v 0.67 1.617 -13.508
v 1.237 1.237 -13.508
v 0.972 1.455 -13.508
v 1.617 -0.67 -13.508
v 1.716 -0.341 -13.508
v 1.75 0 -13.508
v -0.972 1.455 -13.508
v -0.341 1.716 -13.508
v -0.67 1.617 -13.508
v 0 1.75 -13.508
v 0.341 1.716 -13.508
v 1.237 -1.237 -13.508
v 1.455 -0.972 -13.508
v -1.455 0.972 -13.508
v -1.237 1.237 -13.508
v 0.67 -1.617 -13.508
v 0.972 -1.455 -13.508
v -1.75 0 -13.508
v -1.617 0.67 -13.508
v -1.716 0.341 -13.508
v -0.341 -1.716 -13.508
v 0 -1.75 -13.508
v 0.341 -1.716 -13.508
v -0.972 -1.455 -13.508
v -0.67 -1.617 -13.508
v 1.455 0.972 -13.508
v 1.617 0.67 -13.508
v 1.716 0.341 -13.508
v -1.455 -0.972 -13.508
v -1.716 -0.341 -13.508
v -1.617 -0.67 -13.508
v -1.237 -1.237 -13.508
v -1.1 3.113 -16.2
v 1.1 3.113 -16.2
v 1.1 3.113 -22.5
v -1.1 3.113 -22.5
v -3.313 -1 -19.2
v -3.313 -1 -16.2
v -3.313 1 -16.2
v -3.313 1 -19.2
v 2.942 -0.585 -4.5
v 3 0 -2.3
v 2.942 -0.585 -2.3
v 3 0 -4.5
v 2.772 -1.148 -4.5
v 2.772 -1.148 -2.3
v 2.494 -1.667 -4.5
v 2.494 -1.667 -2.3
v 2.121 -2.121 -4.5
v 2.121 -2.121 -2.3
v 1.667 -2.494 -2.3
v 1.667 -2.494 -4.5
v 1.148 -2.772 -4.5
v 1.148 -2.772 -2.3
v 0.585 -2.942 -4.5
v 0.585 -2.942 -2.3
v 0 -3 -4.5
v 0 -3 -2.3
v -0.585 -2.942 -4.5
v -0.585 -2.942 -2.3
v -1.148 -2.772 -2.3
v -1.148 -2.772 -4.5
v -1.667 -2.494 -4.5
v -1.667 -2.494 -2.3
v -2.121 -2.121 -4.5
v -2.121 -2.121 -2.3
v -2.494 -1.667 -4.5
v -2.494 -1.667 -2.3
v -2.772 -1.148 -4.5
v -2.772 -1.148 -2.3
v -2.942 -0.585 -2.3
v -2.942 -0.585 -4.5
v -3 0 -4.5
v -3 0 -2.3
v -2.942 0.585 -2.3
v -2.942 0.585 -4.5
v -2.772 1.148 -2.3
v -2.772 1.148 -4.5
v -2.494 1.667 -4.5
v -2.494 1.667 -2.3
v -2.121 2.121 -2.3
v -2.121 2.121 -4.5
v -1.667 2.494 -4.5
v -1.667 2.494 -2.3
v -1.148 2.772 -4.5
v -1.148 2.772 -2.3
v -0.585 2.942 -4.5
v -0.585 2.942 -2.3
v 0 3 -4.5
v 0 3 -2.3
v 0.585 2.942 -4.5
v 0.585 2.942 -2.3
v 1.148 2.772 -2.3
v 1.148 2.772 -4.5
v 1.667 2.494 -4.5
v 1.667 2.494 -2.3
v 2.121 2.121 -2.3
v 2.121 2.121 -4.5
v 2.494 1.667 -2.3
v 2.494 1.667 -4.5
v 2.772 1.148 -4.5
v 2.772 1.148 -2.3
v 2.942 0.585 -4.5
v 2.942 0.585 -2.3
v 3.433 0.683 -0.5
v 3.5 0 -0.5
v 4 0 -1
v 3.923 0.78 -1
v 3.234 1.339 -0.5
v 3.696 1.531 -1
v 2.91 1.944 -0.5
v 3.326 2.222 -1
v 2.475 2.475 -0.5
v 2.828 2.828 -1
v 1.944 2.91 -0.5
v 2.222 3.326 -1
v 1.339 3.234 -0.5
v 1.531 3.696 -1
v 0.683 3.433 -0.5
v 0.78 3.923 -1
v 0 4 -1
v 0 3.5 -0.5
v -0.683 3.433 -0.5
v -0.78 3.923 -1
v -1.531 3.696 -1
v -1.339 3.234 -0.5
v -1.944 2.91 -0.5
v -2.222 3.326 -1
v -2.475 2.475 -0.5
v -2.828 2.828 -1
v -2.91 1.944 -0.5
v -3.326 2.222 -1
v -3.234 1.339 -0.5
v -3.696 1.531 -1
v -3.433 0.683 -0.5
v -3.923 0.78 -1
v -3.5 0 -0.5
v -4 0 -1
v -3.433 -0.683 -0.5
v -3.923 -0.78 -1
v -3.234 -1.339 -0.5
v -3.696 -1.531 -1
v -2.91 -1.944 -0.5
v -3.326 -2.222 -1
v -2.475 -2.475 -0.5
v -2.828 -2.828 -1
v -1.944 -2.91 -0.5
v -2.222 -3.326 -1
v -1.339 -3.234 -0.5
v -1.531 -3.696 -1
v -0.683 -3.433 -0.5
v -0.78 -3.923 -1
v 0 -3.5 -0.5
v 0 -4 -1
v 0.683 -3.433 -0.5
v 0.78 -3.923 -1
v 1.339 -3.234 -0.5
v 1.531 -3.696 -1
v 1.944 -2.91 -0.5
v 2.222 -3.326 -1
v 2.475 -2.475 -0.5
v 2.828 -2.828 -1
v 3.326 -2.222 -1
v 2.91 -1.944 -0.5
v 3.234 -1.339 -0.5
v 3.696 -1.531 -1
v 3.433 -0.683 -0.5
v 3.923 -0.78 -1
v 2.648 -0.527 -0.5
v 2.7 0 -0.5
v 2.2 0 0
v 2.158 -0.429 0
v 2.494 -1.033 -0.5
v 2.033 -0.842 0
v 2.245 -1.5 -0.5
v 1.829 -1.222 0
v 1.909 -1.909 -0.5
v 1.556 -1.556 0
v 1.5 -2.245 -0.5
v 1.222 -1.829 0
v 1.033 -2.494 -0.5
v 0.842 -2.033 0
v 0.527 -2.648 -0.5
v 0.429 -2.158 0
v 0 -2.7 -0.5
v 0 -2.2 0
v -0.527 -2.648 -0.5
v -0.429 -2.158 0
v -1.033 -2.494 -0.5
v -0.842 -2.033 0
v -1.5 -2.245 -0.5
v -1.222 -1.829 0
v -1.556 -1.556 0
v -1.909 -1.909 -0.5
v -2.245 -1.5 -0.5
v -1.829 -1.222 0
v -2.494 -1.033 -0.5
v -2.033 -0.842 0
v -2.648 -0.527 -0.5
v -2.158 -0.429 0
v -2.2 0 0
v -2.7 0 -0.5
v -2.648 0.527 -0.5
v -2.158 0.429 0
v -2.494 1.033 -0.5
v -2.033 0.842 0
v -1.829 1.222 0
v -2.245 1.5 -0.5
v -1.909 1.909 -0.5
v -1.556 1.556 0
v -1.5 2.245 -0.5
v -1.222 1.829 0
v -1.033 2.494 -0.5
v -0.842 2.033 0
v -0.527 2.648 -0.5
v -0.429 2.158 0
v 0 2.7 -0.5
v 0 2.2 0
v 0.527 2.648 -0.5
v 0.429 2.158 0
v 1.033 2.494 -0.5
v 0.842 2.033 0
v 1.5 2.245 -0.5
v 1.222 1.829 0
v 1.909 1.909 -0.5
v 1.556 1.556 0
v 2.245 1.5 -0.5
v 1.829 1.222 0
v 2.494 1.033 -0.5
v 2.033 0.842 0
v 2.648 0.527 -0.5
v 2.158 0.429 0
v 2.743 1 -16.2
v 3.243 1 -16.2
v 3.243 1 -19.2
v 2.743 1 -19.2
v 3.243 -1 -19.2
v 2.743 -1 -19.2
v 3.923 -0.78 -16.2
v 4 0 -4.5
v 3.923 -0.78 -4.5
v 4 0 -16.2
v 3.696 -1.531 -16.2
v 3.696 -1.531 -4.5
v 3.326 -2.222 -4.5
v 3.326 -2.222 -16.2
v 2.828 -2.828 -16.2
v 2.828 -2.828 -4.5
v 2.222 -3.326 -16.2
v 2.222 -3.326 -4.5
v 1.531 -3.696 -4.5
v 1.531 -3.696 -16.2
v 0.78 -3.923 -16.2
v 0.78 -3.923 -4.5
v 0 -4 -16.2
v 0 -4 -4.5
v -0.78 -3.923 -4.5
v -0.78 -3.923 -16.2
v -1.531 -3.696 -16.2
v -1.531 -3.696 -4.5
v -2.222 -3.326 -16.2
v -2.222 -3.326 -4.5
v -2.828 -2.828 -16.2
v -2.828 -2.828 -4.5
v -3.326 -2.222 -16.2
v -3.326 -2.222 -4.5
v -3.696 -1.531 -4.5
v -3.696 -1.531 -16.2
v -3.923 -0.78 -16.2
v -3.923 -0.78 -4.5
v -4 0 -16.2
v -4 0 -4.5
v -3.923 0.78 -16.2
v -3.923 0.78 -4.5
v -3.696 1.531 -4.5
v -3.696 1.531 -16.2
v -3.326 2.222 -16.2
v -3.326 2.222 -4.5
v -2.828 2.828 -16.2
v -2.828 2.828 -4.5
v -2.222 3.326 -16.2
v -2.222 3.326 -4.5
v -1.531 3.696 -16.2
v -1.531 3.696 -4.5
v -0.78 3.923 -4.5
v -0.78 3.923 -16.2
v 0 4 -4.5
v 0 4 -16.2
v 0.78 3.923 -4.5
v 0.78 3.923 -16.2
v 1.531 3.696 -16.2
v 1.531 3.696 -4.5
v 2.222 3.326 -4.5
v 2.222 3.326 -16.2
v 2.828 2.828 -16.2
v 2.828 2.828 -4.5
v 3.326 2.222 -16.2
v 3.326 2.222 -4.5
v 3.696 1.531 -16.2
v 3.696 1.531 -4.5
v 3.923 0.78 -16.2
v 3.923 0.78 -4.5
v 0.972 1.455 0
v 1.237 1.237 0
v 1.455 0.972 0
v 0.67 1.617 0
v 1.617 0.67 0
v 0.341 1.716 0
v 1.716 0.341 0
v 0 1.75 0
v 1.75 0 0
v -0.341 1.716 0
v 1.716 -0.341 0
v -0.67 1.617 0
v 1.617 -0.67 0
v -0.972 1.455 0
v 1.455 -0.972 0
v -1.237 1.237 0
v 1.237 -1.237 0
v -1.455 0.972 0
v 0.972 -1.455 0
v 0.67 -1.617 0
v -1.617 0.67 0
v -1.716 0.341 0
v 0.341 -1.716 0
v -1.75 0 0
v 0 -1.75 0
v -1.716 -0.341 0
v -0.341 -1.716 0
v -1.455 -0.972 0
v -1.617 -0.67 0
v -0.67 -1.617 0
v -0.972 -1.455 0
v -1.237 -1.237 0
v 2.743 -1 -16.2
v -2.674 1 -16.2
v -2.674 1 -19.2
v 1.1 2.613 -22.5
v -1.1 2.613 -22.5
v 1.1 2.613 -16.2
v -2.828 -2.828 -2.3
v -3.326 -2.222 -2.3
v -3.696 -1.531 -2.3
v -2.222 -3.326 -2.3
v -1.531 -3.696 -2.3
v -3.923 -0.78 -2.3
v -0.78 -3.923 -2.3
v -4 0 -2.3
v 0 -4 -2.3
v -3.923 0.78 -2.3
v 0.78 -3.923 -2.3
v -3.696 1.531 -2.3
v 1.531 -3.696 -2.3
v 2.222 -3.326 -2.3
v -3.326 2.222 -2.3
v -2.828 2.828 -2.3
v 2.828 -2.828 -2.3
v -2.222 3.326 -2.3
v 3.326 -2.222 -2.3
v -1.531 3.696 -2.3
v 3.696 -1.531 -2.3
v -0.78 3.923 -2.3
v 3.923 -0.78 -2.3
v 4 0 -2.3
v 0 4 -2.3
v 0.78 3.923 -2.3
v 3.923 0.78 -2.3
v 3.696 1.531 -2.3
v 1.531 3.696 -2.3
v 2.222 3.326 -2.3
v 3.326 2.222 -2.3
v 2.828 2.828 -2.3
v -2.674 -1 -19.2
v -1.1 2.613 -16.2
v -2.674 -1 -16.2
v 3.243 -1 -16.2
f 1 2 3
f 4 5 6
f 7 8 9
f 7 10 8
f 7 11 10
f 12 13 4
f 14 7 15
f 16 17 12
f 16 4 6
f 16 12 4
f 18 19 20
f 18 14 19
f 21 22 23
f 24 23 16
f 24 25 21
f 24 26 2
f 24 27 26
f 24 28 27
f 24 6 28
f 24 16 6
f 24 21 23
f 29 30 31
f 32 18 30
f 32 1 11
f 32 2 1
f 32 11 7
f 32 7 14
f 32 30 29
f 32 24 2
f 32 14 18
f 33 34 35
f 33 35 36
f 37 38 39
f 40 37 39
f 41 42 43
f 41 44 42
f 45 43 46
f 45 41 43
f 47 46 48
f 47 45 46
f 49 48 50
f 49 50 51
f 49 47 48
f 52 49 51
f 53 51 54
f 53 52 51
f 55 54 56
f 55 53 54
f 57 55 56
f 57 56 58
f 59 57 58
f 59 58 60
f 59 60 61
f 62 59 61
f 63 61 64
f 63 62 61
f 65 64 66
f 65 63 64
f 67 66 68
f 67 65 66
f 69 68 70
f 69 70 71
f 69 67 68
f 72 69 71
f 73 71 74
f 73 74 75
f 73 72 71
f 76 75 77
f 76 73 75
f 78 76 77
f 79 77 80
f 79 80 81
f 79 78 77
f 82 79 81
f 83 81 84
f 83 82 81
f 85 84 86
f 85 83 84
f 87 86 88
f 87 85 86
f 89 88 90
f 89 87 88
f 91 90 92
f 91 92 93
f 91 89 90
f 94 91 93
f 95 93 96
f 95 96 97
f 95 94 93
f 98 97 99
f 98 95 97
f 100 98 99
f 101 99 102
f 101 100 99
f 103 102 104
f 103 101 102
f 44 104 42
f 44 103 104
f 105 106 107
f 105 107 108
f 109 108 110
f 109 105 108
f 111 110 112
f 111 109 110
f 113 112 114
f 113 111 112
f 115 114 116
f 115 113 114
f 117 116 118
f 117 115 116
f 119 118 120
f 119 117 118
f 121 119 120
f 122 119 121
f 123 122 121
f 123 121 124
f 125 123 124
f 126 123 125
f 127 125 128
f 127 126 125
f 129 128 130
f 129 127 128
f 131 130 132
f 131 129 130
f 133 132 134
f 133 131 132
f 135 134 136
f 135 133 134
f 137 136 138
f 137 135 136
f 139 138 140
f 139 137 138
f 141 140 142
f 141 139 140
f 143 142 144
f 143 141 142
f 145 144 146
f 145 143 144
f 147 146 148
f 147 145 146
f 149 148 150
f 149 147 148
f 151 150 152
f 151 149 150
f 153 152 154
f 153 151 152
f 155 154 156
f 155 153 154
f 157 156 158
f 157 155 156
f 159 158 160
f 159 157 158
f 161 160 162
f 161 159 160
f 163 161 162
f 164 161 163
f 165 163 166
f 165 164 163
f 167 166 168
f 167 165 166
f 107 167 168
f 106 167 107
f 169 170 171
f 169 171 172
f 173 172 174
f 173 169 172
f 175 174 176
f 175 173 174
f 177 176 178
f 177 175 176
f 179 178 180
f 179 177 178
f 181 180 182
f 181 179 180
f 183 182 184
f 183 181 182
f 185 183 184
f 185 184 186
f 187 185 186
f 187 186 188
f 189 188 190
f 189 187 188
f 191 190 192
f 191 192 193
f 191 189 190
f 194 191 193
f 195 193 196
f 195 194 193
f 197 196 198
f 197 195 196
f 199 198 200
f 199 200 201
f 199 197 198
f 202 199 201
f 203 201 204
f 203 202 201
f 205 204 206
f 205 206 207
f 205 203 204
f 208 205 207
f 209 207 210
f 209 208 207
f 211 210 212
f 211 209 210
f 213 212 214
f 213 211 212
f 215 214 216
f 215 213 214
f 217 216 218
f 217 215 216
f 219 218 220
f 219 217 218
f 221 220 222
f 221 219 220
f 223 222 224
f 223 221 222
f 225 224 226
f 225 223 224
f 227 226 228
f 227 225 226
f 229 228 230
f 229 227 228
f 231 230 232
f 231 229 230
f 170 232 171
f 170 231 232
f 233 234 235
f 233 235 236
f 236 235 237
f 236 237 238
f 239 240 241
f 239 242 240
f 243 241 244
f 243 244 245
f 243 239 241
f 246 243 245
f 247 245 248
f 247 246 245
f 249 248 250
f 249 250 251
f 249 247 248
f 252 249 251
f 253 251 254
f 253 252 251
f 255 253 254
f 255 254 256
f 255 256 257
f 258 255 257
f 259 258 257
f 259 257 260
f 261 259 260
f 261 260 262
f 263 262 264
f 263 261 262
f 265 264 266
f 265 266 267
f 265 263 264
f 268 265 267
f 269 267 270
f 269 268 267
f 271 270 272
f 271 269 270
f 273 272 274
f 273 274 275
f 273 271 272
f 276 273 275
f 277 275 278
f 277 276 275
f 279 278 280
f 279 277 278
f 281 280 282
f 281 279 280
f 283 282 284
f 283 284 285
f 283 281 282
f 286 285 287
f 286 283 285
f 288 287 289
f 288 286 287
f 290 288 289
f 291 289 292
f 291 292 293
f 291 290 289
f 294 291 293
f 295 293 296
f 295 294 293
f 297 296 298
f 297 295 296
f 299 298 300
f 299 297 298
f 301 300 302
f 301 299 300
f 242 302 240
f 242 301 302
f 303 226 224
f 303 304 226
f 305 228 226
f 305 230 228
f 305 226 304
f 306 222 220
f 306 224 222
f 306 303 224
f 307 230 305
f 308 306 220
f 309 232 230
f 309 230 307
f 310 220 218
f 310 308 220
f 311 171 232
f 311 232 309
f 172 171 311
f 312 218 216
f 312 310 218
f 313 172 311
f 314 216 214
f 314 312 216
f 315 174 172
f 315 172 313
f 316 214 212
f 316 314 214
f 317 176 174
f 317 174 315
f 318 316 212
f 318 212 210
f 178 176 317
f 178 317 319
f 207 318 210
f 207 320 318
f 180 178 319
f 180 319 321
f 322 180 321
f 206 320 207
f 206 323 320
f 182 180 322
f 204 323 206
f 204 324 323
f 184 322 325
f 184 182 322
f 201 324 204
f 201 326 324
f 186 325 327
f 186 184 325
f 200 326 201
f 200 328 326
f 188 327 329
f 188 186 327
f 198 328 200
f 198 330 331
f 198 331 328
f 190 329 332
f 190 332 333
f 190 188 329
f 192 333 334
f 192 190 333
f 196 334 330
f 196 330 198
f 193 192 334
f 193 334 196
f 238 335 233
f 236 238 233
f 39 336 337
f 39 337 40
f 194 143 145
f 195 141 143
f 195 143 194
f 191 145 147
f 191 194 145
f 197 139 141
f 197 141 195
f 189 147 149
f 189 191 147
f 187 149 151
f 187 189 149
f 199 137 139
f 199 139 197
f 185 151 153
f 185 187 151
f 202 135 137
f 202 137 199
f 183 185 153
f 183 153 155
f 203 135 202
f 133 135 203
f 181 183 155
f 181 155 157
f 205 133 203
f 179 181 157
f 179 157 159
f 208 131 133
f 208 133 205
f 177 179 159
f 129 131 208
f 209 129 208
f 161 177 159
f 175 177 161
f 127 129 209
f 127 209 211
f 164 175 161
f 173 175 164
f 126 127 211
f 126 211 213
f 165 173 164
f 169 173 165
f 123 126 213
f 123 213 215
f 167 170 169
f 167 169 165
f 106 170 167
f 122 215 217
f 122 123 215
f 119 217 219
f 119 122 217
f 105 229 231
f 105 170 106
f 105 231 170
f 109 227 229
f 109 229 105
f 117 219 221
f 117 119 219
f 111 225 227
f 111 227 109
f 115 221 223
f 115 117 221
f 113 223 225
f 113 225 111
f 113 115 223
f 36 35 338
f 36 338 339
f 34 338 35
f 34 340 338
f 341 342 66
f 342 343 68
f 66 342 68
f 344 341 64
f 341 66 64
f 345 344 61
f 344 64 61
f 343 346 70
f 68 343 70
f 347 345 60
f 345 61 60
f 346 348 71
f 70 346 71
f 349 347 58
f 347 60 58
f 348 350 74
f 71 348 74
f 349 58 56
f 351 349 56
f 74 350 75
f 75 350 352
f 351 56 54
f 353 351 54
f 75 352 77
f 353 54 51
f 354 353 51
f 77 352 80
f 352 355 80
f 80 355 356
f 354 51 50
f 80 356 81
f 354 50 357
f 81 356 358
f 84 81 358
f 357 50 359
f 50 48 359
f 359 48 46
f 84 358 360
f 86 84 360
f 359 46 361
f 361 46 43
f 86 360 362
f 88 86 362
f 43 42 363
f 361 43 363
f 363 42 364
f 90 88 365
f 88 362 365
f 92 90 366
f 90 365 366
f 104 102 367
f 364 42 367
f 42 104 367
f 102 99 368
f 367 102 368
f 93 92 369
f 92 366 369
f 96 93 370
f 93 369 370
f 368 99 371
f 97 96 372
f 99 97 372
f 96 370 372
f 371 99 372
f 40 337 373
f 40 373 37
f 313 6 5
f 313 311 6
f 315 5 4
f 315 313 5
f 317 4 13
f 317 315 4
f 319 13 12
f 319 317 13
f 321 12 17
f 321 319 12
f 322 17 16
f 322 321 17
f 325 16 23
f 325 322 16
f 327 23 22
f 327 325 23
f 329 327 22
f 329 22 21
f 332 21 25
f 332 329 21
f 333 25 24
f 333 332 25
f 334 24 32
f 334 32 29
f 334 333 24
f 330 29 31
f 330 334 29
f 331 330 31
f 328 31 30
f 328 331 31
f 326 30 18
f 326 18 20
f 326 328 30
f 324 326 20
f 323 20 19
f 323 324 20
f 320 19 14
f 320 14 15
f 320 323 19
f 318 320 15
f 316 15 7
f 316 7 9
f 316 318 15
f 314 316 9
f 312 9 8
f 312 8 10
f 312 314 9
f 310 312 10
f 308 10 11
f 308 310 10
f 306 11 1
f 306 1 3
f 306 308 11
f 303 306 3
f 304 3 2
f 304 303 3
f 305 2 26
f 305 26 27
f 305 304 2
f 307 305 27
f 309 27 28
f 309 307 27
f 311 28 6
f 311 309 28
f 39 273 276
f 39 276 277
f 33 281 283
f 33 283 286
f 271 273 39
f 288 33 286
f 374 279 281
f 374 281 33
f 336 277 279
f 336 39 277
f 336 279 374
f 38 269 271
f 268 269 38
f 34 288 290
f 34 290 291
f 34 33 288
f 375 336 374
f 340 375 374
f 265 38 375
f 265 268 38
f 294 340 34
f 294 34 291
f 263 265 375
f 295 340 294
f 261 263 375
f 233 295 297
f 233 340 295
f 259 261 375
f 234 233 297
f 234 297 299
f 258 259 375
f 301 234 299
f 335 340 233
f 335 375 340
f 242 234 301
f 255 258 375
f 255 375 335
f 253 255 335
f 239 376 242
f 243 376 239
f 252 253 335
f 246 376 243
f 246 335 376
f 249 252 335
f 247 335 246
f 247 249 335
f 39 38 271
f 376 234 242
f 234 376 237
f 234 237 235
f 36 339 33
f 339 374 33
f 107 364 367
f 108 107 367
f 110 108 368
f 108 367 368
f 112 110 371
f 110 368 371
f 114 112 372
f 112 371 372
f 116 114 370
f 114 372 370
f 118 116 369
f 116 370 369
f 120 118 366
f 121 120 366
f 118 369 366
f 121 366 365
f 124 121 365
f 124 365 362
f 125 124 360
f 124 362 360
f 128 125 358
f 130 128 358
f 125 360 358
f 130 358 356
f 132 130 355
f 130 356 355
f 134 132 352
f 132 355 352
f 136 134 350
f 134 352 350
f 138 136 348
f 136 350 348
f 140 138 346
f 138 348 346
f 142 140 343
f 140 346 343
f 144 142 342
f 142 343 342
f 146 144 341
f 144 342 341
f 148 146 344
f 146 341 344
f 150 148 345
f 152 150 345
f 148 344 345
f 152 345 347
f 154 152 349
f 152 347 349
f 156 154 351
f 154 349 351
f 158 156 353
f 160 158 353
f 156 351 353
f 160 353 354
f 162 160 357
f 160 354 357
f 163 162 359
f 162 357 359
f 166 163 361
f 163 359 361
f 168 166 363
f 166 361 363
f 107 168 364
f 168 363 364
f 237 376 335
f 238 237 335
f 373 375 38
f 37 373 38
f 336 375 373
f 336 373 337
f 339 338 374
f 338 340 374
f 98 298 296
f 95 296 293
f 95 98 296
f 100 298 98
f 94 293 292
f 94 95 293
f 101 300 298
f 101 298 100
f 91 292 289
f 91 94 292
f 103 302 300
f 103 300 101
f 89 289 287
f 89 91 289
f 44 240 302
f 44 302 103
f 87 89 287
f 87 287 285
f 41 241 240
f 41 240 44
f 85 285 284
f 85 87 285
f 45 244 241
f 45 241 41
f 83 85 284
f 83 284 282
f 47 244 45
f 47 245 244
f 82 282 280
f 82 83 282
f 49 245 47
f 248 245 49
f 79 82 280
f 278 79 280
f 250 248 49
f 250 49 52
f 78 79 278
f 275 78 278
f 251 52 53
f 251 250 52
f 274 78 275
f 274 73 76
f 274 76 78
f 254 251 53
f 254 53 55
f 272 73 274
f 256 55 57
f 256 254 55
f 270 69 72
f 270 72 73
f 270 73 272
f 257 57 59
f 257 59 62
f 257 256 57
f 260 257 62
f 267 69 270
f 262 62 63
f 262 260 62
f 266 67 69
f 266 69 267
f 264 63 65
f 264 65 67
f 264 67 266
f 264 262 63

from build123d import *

# Parameters (mm, degrees)
BOSS_EXTRUDE1_START = -2.3
SKETCH2_R           = 4
SKETCH2_R_2         = 2.6
BOSS_EXTRUDE1_DEPTH = 1.8
CHAMFER1_SIZE       = 0.5
SKETCH3_W           = 0.5
SKETCH3_H           = 2
SKETCH3_W_2         = 2.2
SKETCH3_H_2         = 0.5
SKETCH3_W_3         = 0.638814793
BOSS_EXTRUDE2_DEPTH = 3
SKETCH4_W           = 2.2
SKETCH4_H           = 0.5
BOSS_EXTRUDE3_DEPTH = 3.3


with BuildPart() as part:
    # Sketch1 → Revolve1 (revolve)
    with BuildSketch(Plane(origin=(0, 0, 0), x_dir=(0, 0, -1), z_dir=(1, 0, 0)), mode=Mode.PRIVATE) as revolve1_sk:
        Polygon((0, 1.75), (0, 2.2), (0.8, 3), (4.5, 3), (4.5, 4), (16.2, 4), (16.2, 0), (13.508423887, 0), (13.508423887, 1.75), align=None)
    revolve(revolve1_sk.sketch.rotate(Axis((0, 0, 3.985074627), (0, 0, -1)), 90), axis=Axis((0, 0, 3.985074627), (0, 0, -1)))

    # Sketch2 → Boss-Extrude1 (add)
    with BuildSketch(Plane.XY.offset(BOSS_EXTRUDE1_START)):
        Circle(SKETCH2_R)
        Circle(SKETCH2_R_2, mode=Mode.SUBTRACT)
    extrude(amount=BOSS_EXTRUDE1_DEPTH)

    # Chamfer1
    chamfer1_edges = [part.edges().sort_by_distance(p)[0] for p in [
        (-4, 0, -0.5),
    ]]
    chamfer(chamfer1_edges, length=CHAMFER1_SIZE)

    # Sketch3 → Boss-Extrude2 (add)
    with BuildSketch(Plane(origin=(0, 0, -16.2), x_dir=(-1, 0, 0), z_dir=(0, 0, -1))):
        with Locations((-2.993209108, 0)):
            Rectangle(SKETCH3_W, SKETCH3_H)
        with Locations((0, 2.862816669)):
            Rectangle(SKETCH3_W_2, SKETCH3_H_2)
        with Locations((2.993209109, 0)):
            Rectangle(SKETCH3_W_3, SKETCH3_H)
    extrude(amount=BOSS_EXTRUDE2_DEPTH)

    # Sketch4 → Boss-Extrude3 (add)
    with BuildSketch(Plane(origin=(0, 0, -19.2), x_dir=(-1, 0, 0), z_dir=(0, 0, -1))):
        with Locations((0, 2.862816669)):
            Rectangle(SKETCH4_W, SKETCH4_H)
    extrude(amount=BOSS_EXTRUDE3_DEPTH)


solid = part.part
